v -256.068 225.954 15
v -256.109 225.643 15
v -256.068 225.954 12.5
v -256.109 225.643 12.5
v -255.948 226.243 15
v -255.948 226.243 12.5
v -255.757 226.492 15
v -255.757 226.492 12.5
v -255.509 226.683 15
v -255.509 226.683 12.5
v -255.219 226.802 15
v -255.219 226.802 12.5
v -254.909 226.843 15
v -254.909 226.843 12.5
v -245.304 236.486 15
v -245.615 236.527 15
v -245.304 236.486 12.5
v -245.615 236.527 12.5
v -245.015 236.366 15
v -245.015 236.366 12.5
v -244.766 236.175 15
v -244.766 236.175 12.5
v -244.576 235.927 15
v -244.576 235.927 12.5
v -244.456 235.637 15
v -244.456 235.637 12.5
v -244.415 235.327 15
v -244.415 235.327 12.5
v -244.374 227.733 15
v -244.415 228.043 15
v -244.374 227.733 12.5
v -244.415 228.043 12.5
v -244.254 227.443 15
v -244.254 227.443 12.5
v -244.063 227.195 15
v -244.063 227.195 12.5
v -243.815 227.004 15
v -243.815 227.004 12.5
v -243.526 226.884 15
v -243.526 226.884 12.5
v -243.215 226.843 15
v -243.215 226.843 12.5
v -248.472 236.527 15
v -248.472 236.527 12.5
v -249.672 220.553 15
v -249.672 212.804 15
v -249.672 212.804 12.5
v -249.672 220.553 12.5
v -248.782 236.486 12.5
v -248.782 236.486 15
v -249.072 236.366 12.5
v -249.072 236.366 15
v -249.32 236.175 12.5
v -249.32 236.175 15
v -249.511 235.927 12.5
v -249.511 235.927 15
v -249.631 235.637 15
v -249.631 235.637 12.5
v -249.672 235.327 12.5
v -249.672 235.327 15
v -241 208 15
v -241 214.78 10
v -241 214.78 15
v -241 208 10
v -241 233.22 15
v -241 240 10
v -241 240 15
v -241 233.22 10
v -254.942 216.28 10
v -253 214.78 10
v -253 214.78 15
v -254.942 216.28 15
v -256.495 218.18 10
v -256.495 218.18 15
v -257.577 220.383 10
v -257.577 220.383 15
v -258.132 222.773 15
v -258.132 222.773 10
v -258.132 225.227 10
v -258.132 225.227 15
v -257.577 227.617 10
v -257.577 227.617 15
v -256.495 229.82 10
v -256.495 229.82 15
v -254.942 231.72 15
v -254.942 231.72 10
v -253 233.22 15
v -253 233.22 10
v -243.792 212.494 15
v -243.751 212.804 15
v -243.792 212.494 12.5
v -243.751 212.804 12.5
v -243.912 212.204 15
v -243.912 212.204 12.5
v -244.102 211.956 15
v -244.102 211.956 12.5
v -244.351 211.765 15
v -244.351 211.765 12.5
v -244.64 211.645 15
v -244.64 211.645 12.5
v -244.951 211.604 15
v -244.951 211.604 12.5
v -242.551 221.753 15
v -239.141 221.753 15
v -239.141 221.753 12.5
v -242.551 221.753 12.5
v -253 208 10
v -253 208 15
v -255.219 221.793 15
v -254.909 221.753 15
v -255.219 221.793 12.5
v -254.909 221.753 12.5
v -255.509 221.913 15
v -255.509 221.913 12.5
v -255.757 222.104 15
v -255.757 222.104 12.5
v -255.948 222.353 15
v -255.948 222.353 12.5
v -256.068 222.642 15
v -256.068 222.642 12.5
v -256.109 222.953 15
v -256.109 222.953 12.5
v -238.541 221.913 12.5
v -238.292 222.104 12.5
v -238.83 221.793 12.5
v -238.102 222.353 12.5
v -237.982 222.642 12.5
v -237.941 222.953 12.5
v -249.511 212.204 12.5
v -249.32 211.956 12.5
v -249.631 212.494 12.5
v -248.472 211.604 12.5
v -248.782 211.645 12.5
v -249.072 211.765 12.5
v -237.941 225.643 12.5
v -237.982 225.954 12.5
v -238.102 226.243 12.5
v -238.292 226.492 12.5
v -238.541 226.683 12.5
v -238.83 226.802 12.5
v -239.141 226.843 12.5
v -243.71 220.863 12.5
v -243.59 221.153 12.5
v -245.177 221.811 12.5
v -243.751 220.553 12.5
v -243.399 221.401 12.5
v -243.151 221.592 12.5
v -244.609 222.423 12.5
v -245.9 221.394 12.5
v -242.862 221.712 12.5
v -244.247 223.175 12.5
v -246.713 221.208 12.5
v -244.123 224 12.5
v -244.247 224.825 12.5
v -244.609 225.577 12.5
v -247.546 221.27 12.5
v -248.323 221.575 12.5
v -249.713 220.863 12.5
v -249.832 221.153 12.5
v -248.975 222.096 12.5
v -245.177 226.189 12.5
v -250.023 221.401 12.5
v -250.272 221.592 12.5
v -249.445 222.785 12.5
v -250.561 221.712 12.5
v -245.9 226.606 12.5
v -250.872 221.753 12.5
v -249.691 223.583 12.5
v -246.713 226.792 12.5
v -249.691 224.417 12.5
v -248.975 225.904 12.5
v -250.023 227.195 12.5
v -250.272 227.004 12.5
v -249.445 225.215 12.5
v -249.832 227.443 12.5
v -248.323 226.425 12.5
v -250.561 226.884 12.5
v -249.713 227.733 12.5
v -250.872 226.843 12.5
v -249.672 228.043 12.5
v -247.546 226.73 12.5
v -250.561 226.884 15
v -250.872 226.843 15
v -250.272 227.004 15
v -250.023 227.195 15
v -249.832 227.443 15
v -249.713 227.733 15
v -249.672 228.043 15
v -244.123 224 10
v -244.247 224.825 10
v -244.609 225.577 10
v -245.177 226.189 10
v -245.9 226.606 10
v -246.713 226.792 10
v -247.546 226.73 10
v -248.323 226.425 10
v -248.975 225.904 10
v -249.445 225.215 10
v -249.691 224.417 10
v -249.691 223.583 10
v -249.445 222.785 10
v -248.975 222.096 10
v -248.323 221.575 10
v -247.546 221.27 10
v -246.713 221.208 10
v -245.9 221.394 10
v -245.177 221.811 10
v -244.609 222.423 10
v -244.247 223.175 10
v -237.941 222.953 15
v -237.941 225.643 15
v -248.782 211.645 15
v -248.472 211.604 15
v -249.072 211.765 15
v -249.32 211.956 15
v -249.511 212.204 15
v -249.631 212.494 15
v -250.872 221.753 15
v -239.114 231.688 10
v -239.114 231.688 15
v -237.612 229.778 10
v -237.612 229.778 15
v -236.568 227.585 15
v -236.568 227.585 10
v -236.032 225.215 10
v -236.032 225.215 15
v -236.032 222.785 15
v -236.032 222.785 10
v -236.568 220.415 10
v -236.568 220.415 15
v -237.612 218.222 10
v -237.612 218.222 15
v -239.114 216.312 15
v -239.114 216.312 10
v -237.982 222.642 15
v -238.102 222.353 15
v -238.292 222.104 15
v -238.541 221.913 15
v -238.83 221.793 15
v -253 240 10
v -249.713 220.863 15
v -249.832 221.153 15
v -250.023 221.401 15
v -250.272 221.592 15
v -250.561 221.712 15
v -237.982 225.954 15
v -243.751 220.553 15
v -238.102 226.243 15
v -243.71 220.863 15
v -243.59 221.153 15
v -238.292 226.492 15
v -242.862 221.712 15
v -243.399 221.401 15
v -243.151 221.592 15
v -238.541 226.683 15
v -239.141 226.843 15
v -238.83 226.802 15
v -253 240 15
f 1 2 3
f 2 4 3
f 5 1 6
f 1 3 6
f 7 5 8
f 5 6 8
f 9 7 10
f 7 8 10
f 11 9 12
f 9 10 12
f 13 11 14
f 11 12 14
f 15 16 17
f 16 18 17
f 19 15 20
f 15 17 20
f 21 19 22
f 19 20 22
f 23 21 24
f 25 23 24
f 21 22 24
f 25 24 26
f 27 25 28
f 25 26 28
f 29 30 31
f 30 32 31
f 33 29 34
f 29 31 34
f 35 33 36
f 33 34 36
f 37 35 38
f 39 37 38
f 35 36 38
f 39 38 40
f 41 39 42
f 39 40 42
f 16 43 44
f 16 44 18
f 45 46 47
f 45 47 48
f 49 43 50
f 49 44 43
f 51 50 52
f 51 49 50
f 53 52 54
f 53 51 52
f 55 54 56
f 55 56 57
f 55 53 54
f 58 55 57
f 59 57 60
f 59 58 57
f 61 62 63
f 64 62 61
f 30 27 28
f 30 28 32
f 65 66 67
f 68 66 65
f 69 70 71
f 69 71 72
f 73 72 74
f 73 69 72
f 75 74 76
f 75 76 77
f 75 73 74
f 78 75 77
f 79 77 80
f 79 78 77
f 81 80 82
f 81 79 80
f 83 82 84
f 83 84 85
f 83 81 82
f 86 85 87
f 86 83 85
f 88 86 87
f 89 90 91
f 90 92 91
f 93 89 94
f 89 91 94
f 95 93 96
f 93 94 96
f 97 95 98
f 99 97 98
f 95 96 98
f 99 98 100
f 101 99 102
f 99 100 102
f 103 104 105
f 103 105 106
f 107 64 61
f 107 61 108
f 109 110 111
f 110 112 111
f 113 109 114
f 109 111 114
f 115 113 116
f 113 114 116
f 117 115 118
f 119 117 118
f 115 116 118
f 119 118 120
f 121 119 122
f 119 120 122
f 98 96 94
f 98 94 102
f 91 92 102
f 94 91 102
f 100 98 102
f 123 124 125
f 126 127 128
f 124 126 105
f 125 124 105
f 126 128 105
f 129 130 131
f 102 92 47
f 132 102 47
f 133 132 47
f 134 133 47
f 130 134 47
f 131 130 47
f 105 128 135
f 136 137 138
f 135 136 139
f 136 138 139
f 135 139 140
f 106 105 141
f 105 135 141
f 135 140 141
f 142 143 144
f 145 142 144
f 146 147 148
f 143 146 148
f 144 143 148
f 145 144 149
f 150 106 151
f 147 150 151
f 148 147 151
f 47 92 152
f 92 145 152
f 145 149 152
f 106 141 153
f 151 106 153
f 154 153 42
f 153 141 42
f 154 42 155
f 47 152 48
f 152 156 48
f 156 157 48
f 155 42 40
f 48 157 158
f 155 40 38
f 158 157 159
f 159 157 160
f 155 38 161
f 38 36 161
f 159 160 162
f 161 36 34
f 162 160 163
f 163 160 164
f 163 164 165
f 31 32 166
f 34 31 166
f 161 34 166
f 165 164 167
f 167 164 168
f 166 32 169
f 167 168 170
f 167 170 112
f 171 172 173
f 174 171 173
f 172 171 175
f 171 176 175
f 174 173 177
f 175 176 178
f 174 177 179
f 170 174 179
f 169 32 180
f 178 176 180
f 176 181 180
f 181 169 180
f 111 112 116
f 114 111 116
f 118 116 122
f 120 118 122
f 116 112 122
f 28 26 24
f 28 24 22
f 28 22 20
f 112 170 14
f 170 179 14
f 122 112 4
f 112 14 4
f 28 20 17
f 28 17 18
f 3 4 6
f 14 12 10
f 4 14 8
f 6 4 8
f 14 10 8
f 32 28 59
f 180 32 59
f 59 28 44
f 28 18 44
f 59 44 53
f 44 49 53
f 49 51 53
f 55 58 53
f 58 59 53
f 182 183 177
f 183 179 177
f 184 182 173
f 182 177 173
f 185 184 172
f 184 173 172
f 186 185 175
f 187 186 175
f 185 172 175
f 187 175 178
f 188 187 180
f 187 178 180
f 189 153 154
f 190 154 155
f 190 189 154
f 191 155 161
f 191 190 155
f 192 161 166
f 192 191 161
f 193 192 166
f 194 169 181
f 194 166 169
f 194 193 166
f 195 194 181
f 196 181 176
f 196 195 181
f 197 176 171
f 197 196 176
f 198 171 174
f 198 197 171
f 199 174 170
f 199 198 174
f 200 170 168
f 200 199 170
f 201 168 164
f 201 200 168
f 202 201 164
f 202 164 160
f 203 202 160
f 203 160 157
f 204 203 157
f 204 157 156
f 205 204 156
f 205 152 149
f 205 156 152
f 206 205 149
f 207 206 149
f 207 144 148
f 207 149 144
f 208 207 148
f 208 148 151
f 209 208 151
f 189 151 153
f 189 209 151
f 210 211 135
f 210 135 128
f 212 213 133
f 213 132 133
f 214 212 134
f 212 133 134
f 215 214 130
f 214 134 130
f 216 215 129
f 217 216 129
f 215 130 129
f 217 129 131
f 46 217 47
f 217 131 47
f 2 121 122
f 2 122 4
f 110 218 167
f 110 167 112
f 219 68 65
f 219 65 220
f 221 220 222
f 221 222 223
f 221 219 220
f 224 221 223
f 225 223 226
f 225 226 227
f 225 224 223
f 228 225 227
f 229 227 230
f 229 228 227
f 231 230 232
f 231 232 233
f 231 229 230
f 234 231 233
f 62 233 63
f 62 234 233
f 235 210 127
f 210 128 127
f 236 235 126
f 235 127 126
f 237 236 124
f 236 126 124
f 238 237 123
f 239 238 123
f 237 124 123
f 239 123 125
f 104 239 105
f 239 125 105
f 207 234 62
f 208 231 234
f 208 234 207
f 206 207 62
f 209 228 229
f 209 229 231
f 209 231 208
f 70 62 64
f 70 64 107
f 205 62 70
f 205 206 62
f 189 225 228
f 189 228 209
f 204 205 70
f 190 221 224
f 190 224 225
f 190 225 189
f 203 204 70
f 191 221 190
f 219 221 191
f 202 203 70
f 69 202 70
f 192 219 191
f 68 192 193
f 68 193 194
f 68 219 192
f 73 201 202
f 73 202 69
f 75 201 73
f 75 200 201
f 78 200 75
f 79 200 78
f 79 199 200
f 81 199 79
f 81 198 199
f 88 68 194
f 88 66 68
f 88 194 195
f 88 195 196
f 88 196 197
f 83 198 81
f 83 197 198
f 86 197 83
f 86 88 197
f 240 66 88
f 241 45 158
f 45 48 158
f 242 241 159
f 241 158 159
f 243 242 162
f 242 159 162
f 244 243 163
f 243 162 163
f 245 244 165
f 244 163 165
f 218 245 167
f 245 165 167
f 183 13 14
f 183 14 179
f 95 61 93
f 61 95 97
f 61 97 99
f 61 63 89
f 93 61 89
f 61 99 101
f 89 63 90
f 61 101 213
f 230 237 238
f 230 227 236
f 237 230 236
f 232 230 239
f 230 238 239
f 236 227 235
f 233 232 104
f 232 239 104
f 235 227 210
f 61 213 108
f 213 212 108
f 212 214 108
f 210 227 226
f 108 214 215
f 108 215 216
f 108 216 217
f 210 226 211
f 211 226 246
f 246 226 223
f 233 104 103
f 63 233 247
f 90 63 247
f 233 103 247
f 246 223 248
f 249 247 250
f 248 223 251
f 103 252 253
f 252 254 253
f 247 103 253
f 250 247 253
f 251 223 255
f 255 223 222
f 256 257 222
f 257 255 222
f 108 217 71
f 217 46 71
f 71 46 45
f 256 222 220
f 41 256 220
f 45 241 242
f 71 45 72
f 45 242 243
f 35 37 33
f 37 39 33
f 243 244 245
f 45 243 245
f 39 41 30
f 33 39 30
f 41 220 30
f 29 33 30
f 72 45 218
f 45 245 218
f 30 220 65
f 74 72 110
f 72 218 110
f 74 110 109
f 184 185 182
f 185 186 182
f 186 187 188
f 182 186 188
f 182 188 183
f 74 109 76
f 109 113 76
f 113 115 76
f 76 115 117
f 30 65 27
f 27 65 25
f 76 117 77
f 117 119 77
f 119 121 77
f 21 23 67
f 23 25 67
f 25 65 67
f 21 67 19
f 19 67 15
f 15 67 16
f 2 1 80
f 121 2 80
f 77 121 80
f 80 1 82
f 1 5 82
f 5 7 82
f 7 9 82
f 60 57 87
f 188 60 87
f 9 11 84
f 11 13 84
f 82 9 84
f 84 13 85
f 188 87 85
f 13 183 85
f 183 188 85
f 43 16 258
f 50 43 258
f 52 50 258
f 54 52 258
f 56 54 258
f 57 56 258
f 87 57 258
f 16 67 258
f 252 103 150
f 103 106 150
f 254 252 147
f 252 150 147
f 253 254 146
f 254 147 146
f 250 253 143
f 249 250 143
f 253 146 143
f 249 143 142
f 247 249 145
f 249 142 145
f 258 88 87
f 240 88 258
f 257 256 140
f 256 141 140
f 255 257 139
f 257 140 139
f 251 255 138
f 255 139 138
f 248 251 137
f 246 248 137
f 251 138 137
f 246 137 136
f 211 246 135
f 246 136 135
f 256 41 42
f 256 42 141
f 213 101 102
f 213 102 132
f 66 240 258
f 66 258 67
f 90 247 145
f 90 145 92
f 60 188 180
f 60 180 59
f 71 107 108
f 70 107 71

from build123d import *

# Parameters (mm, degrees)
SKETCH1_R           = 2.8
BOSS_EXTRUDE1_DEPTH = 5
CUT_EXTRUDE1_DEPTH  = 2.5
FILLET1_R           = 1.2


with BuildPart() as part:
    # Sketch1 → Boss-Extrude1 (new body)
    with BuildSketch(Plane.XY.offset(10)):
        with BuildLine():
            Line((-253, 240), (-241, 240))
            Line((-241, 240), (-241, 233.219543457))
            ThreePointArc((-241, 233.219543457), (-235.964643127, 224), (-241, 214.780456543))
            Line((-241, 214.780456543), (-241, 208))
            Line((-241, 208), (-253, 208))
            Line((-253, 208), (-253, 214.780456543))
            ThreePointArc((-253, 214.780456543), (-258.20228405, 224), (-253, 233.219543457))
            Line((-253, 233.219543457), (-253, 240))
        make_face()
        with Locations((-246.922635101, 224)):
            Circle(SKETCH1_R, mode=Mode.SUBTRACT)
    extrude(amount=BOSS_EXTRUDE1_DEPTH)

    # Sketch2 → Cut-Extrude1 (cut)
    with BuildSketch(Plane.XY.offset(15)):
        Polygon((-249.671711, 236.526764937), (-244.414971283, 236.526764937), (-244.414971283, 226.843297037), (-237.940881316, 226.843297037), (-237.940881316, 221.752559627), (-243.750962055, 221.752559627), (-243.750962055, 211.604094919), (-249.671711, 211.604094919), (-249.671711, 221.752559627), (-256.108895334, 221.752559627), (-256.108895334, 226.843297037), (-249.671711, 226.843297037), align=None)
    extrude(amount=-CUT_EXTRUDE1_DEPTH, mode=Mode.SUBTRACT)

    # Fillet1
    fillet1_edges = [part.edges().sort_by_distance(p)[0] for p in [
        (-249.671711, 226.843297037, 13.75),
        (-249.671711, 236.526764937, 13.75),
        (-244.414971283, 236.526764937, 13.75),
        (-244.414971283, 226.843297037, 13.75),
        (-237.940881316, 226.843297037, 13.75),
        (-237.940881316, 221.752559627, 13.75),
        (-243.750962055, 221.752559627, 13.75),
        (-243.750962055, 211.604094919, 13.75),
        (-249.671711, 211.604094919, 13.75),
        (-249.671711, 221.752559627, 13.75),
        (-256.108895334, 221.752559627, 13.75),
        (-256.108895334, 226.843297037, 13.75),
    ]]
    fillet(fillet1_edges, radius=FILLET1_R)


solid = part.part
